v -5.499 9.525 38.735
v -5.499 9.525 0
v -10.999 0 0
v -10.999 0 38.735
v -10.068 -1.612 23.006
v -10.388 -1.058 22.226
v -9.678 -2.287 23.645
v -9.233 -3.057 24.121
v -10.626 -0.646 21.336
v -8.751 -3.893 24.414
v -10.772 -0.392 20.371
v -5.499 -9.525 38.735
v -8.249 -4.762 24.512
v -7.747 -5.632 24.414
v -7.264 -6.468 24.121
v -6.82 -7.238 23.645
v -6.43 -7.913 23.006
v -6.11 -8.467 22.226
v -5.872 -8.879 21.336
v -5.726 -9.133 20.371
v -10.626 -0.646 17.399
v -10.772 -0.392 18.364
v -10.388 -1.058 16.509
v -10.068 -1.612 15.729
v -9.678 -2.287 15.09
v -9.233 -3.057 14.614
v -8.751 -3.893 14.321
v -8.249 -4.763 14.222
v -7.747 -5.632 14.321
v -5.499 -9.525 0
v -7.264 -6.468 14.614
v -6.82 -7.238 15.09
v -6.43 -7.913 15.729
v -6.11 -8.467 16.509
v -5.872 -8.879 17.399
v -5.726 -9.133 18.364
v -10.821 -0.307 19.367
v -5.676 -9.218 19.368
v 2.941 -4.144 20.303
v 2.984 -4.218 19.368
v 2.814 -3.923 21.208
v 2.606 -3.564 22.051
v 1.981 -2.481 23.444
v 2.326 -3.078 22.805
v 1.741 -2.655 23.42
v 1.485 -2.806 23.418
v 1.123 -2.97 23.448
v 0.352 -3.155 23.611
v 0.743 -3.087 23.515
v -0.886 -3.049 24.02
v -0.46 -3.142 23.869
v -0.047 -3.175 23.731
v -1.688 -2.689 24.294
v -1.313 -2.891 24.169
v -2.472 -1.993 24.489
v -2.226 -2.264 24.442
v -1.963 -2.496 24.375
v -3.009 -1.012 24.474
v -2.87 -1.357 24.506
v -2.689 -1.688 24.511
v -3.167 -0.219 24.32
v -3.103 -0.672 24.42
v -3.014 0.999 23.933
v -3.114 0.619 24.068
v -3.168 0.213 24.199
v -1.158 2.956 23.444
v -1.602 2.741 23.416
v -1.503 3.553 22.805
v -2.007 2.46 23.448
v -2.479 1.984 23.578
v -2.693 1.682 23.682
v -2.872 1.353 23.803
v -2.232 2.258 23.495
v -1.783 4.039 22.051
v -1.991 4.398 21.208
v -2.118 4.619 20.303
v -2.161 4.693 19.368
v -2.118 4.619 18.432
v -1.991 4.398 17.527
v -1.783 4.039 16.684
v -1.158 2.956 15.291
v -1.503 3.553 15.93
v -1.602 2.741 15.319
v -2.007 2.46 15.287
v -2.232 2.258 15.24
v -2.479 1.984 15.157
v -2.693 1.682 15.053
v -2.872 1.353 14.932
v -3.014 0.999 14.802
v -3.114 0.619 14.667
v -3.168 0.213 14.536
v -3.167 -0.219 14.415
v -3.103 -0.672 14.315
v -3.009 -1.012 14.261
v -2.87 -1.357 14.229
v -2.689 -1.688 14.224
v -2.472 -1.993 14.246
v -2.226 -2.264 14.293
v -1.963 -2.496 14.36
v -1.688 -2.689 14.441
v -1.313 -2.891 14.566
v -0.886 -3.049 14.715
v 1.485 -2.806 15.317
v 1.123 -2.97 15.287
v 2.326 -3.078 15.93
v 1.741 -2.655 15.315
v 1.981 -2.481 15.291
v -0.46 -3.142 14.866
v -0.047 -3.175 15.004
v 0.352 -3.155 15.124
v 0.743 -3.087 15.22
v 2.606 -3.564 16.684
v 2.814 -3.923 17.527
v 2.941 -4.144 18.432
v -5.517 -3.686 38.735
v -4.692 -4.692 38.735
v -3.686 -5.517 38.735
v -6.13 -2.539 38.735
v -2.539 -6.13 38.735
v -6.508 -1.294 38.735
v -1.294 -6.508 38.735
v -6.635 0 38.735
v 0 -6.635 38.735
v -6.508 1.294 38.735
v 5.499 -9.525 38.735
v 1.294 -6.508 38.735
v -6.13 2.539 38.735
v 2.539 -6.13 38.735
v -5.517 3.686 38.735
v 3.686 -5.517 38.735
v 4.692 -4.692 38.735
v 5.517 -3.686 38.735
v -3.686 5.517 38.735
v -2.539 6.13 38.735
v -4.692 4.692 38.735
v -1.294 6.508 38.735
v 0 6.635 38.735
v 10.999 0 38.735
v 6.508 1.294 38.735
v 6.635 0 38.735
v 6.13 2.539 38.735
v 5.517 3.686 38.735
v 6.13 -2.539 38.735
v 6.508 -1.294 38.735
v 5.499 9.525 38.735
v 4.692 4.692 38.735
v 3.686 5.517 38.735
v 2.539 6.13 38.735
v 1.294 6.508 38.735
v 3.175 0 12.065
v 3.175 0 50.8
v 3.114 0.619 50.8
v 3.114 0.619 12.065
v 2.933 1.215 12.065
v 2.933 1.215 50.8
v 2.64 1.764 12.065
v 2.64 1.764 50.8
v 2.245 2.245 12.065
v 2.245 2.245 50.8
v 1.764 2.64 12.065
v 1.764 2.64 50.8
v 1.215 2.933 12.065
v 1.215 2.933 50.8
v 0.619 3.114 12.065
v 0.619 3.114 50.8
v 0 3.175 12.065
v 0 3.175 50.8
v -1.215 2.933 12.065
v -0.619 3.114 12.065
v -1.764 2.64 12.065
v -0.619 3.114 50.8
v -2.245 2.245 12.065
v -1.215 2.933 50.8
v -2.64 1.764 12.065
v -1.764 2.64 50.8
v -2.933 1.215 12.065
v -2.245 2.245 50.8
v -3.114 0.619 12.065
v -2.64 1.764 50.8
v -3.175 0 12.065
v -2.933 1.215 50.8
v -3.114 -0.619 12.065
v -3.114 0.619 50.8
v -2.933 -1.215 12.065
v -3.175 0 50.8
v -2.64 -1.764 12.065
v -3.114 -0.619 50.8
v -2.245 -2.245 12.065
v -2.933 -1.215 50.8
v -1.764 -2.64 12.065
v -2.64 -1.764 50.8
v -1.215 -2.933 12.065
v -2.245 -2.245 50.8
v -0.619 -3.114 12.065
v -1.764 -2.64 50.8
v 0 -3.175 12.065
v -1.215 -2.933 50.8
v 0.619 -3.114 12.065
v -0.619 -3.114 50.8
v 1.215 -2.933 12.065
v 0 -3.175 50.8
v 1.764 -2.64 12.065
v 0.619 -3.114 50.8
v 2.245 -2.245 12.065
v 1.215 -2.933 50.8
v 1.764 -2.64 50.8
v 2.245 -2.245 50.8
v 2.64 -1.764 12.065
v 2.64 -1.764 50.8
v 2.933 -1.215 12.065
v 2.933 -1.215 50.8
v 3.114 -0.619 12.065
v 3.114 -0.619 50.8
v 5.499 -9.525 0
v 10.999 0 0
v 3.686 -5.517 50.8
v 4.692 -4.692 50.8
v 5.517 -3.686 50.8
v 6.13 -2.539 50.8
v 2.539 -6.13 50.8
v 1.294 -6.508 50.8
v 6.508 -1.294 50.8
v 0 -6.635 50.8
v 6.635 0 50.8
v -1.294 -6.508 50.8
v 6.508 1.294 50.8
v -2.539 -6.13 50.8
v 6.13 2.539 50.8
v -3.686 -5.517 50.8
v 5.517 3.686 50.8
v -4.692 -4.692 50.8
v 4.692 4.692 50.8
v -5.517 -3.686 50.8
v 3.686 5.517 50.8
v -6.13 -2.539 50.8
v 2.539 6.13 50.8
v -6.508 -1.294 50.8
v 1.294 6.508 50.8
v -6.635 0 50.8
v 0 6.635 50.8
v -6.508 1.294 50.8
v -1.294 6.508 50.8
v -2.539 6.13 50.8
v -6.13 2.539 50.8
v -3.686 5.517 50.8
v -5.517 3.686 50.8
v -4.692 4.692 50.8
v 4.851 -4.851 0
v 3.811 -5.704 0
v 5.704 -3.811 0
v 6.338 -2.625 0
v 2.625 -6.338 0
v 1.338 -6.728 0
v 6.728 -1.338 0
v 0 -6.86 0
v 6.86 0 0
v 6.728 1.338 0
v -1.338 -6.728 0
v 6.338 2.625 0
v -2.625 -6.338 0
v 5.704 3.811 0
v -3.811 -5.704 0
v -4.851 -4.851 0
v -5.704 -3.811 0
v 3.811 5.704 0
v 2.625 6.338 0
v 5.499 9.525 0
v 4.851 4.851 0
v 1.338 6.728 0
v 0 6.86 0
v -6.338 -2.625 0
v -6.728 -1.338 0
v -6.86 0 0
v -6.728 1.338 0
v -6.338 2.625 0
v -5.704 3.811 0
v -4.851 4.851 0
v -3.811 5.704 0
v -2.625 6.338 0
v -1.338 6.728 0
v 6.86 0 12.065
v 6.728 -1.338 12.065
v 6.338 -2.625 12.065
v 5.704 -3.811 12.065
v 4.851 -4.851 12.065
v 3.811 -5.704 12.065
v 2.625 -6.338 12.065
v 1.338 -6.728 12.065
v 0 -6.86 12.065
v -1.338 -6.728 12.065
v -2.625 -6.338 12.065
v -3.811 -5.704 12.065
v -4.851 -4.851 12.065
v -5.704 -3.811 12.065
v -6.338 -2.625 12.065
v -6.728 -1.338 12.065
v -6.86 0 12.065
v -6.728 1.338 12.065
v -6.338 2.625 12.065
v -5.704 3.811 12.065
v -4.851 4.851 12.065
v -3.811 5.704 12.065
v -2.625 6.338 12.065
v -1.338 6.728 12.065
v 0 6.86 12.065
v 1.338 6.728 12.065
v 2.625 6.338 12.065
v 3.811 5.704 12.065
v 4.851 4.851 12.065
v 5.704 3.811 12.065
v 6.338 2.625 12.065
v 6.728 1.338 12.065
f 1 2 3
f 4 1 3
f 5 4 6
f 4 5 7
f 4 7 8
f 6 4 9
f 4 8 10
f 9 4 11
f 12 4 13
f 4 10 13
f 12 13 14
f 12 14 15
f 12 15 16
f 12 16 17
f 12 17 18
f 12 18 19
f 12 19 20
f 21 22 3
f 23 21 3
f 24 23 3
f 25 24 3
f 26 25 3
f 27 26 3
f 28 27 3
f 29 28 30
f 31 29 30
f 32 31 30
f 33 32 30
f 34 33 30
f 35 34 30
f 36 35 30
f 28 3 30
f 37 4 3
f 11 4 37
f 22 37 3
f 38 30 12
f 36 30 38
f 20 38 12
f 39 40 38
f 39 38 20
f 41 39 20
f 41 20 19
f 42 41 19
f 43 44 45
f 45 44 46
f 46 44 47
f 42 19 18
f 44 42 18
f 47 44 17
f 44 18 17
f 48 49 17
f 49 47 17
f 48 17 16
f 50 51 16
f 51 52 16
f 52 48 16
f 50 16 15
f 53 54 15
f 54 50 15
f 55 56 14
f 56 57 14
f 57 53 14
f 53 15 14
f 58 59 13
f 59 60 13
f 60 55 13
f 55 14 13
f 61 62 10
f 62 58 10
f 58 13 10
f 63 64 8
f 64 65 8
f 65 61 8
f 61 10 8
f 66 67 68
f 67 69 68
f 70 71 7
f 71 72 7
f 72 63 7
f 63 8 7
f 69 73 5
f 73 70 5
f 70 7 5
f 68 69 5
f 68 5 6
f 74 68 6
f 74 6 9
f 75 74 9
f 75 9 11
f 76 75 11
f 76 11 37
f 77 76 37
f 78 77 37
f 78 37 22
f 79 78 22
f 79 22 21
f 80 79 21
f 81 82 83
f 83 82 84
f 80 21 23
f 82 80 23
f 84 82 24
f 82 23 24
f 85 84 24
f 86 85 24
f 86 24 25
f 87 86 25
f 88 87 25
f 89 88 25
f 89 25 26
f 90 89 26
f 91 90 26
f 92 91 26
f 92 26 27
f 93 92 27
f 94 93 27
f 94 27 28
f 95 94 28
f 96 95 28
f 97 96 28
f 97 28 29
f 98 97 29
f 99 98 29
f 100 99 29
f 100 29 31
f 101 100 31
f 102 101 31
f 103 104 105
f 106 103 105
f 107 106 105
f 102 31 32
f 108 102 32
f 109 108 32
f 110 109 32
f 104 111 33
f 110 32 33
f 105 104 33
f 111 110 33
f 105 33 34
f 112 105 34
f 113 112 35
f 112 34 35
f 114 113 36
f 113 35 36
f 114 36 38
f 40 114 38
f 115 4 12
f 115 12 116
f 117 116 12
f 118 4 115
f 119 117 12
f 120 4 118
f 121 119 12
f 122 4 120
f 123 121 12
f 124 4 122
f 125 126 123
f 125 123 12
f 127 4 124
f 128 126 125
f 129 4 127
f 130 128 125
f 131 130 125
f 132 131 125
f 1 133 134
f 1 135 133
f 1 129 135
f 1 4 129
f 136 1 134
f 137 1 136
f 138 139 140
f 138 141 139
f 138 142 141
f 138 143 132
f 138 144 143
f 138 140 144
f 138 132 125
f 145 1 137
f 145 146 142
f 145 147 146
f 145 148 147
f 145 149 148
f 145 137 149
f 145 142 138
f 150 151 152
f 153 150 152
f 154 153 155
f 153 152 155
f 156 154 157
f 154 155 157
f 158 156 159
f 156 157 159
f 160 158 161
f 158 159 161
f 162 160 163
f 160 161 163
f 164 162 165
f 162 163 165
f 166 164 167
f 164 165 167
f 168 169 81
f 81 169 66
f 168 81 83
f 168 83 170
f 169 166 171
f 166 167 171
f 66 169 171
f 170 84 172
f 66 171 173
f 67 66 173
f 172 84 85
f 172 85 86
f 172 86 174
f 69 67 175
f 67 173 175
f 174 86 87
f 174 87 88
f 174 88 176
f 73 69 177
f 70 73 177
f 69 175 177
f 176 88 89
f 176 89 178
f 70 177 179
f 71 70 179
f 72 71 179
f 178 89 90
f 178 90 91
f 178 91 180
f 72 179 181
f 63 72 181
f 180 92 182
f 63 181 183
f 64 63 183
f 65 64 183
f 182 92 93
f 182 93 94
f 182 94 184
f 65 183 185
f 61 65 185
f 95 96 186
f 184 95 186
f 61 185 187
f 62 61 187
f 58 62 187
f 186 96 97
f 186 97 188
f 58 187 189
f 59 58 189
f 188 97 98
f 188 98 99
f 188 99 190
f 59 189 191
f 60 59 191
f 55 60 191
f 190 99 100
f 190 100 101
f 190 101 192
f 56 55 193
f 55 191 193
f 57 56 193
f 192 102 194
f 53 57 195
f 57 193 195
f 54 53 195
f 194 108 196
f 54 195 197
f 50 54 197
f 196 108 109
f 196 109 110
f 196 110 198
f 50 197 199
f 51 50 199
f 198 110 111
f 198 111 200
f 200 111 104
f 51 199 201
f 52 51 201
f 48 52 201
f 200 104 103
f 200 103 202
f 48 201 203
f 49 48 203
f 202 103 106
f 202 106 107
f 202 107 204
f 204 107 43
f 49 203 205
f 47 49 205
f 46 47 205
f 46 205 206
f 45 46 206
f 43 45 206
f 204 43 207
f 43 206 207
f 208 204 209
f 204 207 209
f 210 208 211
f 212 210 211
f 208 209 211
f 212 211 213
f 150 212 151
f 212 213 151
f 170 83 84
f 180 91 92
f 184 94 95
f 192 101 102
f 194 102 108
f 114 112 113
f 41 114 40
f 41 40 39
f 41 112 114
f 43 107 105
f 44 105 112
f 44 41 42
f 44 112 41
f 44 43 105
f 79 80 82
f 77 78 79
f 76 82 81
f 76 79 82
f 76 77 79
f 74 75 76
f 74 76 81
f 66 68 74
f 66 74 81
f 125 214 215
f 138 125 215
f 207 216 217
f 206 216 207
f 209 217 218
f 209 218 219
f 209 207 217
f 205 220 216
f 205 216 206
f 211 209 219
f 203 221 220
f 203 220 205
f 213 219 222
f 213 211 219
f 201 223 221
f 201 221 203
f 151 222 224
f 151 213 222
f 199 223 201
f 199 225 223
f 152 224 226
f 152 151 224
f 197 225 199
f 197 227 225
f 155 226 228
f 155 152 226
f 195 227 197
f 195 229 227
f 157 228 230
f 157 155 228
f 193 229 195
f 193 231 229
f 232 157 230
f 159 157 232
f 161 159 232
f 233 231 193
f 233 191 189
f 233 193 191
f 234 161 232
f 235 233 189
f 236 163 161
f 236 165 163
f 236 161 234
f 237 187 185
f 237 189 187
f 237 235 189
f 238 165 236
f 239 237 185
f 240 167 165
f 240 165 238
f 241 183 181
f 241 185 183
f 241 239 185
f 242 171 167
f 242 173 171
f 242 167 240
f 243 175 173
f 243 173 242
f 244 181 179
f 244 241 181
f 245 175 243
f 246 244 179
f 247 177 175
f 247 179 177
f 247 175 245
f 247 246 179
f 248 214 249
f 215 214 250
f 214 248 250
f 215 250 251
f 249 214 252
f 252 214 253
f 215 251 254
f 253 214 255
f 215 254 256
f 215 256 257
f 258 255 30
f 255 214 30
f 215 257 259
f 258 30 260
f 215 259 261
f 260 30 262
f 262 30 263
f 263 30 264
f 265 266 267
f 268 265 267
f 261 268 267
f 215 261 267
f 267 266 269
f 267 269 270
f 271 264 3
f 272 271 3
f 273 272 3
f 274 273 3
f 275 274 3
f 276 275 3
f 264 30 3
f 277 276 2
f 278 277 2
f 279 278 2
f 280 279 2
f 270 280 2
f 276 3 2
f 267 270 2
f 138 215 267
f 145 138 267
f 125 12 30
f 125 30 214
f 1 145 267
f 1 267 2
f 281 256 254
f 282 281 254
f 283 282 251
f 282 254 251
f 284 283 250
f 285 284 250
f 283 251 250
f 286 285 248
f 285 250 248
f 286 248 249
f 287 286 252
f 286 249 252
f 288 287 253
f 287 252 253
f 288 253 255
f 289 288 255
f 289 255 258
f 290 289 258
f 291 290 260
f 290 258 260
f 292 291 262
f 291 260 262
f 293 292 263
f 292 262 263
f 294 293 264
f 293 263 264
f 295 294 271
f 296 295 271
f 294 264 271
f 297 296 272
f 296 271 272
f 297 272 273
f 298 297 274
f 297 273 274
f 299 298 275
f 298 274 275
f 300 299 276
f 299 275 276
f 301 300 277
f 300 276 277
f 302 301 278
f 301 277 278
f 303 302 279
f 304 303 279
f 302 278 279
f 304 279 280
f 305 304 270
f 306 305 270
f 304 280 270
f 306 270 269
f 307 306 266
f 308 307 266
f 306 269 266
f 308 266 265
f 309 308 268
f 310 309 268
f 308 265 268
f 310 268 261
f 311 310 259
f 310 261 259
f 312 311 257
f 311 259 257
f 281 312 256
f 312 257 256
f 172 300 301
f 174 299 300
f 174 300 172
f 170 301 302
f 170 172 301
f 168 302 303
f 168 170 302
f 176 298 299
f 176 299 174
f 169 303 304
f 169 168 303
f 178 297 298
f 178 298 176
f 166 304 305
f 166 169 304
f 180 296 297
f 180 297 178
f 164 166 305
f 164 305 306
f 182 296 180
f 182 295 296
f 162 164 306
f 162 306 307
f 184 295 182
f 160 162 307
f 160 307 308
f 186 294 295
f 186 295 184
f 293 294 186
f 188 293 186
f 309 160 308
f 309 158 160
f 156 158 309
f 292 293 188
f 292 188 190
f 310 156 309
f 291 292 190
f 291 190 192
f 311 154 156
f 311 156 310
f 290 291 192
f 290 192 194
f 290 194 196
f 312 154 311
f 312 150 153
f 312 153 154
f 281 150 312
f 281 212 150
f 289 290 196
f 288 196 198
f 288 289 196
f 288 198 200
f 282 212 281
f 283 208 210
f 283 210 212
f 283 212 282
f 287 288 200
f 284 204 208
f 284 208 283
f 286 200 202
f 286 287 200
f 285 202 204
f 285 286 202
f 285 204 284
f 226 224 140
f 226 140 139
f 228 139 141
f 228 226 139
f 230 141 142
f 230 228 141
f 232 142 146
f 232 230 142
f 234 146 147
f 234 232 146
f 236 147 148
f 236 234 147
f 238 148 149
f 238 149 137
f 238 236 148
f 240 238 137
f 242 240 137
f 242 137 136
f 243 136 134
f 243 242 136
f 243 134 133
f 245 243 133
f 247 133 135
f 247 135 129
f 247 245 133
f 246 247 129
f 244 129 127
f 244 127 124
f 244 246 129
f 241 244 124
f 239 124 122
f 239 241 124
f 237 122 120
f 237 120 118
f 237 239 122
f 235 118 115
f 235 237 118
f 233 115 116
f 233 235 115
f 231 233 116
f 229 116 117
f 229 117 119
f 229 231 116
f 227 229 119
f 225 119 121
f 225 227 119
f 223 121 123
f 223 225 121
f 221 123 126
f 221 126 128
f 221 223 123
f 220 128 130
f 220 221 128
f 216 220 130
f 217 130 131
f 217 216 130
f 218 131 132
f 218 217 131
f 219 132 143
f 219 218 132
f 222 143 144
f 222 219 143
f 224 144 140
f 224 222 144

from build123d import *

# Parameters (mm, degrees)
BOSS_EXTRUDE1_DEPTH = 50.8
SKETCH4_R           = 3.175
CUT_EXTRUDE2_DEPTH  = 51.8
SKETCH2_R           = 6.635
CUT_EXTRUDE1_DEPTH  = 12.065
SKETCH3_R           = 6.86
CUT_EXTRUDE3_DEPTH  = 12.065
SKETCH5_R           = 5.145
CUT_EXTRUDE4_DEPTH  = 10


with BuildPart() as part:
    # Sketch1 → Boss-Extrude1 (new body)
    with BuildSketch(Plane(origin=(0, 0, 0), x_dir=(0, 1, 0), z_dir=(0, 0, 1))):
        Polygon((9.525, -5.499261314), (9.525, 5.499261314), (0, 10.998522628), (-9.525, 5.499261314), (-9.525, -5.499261314), (0, -10.998522628), align=None)
    extrude(amount=BOSS_EXTRUDE1_DEPTH)

    # Sketch4 → Cut-Extrude2 (cut, through all)
    with BuildSketch(Plane.XY.offset(50.8)):
        Circle(SKETCH4_R)
    extrude(amount=-CUT_EXTRUDE2_DEPTH, mode=Mode.SUBTRACT)

    # Sketch2 → Cut-Extrude1 (cut)
    with BuildSketch(Plane.XY.offset(50.8)):
        Polygon((10.998522628, 0), (5.499261314, 9.525), (-5.499261314, 9.525), (-10.998522628, 0), (-5.499261314, -9.525), (5.499261314, -9.525), align=None)
        Circle(SKETCH2_R, mode=Mode.SUBTRACT)
    extrude(amount=-CUT_EXTRUDE1_DEPTH, mode=Mode.SUBTRACT)

    # Sketch3 → Cut-Extrude3 (cut)
    with BuildSketch(Plane(origin=(0, 0, 0), x_dir=(1, 0, 0), z_dir=(0, 0, -1))):
        Circle(SKETCH3_R)
    extrude(amount=-CUT_EXTRUDE3_DEPTH, mode=Mode.SUBTRACT)

    # Sketch5 → Cut-Extrude4 (cut)
    with BuildSketch(Plane(origin=(-8.248891971, -4.7625, 0), x_dir=(0.5, -0.866025404, 0), z_dir=(-0.866025404, -0.5, 0))):
        with Locations((0, 19.3675)):
            Circle(SKETCH5_R)
    extrude(amount=-CUT_EXTRUDE4_DEPTH, mode=Mode.SUBTRACT)


solid = part.part
